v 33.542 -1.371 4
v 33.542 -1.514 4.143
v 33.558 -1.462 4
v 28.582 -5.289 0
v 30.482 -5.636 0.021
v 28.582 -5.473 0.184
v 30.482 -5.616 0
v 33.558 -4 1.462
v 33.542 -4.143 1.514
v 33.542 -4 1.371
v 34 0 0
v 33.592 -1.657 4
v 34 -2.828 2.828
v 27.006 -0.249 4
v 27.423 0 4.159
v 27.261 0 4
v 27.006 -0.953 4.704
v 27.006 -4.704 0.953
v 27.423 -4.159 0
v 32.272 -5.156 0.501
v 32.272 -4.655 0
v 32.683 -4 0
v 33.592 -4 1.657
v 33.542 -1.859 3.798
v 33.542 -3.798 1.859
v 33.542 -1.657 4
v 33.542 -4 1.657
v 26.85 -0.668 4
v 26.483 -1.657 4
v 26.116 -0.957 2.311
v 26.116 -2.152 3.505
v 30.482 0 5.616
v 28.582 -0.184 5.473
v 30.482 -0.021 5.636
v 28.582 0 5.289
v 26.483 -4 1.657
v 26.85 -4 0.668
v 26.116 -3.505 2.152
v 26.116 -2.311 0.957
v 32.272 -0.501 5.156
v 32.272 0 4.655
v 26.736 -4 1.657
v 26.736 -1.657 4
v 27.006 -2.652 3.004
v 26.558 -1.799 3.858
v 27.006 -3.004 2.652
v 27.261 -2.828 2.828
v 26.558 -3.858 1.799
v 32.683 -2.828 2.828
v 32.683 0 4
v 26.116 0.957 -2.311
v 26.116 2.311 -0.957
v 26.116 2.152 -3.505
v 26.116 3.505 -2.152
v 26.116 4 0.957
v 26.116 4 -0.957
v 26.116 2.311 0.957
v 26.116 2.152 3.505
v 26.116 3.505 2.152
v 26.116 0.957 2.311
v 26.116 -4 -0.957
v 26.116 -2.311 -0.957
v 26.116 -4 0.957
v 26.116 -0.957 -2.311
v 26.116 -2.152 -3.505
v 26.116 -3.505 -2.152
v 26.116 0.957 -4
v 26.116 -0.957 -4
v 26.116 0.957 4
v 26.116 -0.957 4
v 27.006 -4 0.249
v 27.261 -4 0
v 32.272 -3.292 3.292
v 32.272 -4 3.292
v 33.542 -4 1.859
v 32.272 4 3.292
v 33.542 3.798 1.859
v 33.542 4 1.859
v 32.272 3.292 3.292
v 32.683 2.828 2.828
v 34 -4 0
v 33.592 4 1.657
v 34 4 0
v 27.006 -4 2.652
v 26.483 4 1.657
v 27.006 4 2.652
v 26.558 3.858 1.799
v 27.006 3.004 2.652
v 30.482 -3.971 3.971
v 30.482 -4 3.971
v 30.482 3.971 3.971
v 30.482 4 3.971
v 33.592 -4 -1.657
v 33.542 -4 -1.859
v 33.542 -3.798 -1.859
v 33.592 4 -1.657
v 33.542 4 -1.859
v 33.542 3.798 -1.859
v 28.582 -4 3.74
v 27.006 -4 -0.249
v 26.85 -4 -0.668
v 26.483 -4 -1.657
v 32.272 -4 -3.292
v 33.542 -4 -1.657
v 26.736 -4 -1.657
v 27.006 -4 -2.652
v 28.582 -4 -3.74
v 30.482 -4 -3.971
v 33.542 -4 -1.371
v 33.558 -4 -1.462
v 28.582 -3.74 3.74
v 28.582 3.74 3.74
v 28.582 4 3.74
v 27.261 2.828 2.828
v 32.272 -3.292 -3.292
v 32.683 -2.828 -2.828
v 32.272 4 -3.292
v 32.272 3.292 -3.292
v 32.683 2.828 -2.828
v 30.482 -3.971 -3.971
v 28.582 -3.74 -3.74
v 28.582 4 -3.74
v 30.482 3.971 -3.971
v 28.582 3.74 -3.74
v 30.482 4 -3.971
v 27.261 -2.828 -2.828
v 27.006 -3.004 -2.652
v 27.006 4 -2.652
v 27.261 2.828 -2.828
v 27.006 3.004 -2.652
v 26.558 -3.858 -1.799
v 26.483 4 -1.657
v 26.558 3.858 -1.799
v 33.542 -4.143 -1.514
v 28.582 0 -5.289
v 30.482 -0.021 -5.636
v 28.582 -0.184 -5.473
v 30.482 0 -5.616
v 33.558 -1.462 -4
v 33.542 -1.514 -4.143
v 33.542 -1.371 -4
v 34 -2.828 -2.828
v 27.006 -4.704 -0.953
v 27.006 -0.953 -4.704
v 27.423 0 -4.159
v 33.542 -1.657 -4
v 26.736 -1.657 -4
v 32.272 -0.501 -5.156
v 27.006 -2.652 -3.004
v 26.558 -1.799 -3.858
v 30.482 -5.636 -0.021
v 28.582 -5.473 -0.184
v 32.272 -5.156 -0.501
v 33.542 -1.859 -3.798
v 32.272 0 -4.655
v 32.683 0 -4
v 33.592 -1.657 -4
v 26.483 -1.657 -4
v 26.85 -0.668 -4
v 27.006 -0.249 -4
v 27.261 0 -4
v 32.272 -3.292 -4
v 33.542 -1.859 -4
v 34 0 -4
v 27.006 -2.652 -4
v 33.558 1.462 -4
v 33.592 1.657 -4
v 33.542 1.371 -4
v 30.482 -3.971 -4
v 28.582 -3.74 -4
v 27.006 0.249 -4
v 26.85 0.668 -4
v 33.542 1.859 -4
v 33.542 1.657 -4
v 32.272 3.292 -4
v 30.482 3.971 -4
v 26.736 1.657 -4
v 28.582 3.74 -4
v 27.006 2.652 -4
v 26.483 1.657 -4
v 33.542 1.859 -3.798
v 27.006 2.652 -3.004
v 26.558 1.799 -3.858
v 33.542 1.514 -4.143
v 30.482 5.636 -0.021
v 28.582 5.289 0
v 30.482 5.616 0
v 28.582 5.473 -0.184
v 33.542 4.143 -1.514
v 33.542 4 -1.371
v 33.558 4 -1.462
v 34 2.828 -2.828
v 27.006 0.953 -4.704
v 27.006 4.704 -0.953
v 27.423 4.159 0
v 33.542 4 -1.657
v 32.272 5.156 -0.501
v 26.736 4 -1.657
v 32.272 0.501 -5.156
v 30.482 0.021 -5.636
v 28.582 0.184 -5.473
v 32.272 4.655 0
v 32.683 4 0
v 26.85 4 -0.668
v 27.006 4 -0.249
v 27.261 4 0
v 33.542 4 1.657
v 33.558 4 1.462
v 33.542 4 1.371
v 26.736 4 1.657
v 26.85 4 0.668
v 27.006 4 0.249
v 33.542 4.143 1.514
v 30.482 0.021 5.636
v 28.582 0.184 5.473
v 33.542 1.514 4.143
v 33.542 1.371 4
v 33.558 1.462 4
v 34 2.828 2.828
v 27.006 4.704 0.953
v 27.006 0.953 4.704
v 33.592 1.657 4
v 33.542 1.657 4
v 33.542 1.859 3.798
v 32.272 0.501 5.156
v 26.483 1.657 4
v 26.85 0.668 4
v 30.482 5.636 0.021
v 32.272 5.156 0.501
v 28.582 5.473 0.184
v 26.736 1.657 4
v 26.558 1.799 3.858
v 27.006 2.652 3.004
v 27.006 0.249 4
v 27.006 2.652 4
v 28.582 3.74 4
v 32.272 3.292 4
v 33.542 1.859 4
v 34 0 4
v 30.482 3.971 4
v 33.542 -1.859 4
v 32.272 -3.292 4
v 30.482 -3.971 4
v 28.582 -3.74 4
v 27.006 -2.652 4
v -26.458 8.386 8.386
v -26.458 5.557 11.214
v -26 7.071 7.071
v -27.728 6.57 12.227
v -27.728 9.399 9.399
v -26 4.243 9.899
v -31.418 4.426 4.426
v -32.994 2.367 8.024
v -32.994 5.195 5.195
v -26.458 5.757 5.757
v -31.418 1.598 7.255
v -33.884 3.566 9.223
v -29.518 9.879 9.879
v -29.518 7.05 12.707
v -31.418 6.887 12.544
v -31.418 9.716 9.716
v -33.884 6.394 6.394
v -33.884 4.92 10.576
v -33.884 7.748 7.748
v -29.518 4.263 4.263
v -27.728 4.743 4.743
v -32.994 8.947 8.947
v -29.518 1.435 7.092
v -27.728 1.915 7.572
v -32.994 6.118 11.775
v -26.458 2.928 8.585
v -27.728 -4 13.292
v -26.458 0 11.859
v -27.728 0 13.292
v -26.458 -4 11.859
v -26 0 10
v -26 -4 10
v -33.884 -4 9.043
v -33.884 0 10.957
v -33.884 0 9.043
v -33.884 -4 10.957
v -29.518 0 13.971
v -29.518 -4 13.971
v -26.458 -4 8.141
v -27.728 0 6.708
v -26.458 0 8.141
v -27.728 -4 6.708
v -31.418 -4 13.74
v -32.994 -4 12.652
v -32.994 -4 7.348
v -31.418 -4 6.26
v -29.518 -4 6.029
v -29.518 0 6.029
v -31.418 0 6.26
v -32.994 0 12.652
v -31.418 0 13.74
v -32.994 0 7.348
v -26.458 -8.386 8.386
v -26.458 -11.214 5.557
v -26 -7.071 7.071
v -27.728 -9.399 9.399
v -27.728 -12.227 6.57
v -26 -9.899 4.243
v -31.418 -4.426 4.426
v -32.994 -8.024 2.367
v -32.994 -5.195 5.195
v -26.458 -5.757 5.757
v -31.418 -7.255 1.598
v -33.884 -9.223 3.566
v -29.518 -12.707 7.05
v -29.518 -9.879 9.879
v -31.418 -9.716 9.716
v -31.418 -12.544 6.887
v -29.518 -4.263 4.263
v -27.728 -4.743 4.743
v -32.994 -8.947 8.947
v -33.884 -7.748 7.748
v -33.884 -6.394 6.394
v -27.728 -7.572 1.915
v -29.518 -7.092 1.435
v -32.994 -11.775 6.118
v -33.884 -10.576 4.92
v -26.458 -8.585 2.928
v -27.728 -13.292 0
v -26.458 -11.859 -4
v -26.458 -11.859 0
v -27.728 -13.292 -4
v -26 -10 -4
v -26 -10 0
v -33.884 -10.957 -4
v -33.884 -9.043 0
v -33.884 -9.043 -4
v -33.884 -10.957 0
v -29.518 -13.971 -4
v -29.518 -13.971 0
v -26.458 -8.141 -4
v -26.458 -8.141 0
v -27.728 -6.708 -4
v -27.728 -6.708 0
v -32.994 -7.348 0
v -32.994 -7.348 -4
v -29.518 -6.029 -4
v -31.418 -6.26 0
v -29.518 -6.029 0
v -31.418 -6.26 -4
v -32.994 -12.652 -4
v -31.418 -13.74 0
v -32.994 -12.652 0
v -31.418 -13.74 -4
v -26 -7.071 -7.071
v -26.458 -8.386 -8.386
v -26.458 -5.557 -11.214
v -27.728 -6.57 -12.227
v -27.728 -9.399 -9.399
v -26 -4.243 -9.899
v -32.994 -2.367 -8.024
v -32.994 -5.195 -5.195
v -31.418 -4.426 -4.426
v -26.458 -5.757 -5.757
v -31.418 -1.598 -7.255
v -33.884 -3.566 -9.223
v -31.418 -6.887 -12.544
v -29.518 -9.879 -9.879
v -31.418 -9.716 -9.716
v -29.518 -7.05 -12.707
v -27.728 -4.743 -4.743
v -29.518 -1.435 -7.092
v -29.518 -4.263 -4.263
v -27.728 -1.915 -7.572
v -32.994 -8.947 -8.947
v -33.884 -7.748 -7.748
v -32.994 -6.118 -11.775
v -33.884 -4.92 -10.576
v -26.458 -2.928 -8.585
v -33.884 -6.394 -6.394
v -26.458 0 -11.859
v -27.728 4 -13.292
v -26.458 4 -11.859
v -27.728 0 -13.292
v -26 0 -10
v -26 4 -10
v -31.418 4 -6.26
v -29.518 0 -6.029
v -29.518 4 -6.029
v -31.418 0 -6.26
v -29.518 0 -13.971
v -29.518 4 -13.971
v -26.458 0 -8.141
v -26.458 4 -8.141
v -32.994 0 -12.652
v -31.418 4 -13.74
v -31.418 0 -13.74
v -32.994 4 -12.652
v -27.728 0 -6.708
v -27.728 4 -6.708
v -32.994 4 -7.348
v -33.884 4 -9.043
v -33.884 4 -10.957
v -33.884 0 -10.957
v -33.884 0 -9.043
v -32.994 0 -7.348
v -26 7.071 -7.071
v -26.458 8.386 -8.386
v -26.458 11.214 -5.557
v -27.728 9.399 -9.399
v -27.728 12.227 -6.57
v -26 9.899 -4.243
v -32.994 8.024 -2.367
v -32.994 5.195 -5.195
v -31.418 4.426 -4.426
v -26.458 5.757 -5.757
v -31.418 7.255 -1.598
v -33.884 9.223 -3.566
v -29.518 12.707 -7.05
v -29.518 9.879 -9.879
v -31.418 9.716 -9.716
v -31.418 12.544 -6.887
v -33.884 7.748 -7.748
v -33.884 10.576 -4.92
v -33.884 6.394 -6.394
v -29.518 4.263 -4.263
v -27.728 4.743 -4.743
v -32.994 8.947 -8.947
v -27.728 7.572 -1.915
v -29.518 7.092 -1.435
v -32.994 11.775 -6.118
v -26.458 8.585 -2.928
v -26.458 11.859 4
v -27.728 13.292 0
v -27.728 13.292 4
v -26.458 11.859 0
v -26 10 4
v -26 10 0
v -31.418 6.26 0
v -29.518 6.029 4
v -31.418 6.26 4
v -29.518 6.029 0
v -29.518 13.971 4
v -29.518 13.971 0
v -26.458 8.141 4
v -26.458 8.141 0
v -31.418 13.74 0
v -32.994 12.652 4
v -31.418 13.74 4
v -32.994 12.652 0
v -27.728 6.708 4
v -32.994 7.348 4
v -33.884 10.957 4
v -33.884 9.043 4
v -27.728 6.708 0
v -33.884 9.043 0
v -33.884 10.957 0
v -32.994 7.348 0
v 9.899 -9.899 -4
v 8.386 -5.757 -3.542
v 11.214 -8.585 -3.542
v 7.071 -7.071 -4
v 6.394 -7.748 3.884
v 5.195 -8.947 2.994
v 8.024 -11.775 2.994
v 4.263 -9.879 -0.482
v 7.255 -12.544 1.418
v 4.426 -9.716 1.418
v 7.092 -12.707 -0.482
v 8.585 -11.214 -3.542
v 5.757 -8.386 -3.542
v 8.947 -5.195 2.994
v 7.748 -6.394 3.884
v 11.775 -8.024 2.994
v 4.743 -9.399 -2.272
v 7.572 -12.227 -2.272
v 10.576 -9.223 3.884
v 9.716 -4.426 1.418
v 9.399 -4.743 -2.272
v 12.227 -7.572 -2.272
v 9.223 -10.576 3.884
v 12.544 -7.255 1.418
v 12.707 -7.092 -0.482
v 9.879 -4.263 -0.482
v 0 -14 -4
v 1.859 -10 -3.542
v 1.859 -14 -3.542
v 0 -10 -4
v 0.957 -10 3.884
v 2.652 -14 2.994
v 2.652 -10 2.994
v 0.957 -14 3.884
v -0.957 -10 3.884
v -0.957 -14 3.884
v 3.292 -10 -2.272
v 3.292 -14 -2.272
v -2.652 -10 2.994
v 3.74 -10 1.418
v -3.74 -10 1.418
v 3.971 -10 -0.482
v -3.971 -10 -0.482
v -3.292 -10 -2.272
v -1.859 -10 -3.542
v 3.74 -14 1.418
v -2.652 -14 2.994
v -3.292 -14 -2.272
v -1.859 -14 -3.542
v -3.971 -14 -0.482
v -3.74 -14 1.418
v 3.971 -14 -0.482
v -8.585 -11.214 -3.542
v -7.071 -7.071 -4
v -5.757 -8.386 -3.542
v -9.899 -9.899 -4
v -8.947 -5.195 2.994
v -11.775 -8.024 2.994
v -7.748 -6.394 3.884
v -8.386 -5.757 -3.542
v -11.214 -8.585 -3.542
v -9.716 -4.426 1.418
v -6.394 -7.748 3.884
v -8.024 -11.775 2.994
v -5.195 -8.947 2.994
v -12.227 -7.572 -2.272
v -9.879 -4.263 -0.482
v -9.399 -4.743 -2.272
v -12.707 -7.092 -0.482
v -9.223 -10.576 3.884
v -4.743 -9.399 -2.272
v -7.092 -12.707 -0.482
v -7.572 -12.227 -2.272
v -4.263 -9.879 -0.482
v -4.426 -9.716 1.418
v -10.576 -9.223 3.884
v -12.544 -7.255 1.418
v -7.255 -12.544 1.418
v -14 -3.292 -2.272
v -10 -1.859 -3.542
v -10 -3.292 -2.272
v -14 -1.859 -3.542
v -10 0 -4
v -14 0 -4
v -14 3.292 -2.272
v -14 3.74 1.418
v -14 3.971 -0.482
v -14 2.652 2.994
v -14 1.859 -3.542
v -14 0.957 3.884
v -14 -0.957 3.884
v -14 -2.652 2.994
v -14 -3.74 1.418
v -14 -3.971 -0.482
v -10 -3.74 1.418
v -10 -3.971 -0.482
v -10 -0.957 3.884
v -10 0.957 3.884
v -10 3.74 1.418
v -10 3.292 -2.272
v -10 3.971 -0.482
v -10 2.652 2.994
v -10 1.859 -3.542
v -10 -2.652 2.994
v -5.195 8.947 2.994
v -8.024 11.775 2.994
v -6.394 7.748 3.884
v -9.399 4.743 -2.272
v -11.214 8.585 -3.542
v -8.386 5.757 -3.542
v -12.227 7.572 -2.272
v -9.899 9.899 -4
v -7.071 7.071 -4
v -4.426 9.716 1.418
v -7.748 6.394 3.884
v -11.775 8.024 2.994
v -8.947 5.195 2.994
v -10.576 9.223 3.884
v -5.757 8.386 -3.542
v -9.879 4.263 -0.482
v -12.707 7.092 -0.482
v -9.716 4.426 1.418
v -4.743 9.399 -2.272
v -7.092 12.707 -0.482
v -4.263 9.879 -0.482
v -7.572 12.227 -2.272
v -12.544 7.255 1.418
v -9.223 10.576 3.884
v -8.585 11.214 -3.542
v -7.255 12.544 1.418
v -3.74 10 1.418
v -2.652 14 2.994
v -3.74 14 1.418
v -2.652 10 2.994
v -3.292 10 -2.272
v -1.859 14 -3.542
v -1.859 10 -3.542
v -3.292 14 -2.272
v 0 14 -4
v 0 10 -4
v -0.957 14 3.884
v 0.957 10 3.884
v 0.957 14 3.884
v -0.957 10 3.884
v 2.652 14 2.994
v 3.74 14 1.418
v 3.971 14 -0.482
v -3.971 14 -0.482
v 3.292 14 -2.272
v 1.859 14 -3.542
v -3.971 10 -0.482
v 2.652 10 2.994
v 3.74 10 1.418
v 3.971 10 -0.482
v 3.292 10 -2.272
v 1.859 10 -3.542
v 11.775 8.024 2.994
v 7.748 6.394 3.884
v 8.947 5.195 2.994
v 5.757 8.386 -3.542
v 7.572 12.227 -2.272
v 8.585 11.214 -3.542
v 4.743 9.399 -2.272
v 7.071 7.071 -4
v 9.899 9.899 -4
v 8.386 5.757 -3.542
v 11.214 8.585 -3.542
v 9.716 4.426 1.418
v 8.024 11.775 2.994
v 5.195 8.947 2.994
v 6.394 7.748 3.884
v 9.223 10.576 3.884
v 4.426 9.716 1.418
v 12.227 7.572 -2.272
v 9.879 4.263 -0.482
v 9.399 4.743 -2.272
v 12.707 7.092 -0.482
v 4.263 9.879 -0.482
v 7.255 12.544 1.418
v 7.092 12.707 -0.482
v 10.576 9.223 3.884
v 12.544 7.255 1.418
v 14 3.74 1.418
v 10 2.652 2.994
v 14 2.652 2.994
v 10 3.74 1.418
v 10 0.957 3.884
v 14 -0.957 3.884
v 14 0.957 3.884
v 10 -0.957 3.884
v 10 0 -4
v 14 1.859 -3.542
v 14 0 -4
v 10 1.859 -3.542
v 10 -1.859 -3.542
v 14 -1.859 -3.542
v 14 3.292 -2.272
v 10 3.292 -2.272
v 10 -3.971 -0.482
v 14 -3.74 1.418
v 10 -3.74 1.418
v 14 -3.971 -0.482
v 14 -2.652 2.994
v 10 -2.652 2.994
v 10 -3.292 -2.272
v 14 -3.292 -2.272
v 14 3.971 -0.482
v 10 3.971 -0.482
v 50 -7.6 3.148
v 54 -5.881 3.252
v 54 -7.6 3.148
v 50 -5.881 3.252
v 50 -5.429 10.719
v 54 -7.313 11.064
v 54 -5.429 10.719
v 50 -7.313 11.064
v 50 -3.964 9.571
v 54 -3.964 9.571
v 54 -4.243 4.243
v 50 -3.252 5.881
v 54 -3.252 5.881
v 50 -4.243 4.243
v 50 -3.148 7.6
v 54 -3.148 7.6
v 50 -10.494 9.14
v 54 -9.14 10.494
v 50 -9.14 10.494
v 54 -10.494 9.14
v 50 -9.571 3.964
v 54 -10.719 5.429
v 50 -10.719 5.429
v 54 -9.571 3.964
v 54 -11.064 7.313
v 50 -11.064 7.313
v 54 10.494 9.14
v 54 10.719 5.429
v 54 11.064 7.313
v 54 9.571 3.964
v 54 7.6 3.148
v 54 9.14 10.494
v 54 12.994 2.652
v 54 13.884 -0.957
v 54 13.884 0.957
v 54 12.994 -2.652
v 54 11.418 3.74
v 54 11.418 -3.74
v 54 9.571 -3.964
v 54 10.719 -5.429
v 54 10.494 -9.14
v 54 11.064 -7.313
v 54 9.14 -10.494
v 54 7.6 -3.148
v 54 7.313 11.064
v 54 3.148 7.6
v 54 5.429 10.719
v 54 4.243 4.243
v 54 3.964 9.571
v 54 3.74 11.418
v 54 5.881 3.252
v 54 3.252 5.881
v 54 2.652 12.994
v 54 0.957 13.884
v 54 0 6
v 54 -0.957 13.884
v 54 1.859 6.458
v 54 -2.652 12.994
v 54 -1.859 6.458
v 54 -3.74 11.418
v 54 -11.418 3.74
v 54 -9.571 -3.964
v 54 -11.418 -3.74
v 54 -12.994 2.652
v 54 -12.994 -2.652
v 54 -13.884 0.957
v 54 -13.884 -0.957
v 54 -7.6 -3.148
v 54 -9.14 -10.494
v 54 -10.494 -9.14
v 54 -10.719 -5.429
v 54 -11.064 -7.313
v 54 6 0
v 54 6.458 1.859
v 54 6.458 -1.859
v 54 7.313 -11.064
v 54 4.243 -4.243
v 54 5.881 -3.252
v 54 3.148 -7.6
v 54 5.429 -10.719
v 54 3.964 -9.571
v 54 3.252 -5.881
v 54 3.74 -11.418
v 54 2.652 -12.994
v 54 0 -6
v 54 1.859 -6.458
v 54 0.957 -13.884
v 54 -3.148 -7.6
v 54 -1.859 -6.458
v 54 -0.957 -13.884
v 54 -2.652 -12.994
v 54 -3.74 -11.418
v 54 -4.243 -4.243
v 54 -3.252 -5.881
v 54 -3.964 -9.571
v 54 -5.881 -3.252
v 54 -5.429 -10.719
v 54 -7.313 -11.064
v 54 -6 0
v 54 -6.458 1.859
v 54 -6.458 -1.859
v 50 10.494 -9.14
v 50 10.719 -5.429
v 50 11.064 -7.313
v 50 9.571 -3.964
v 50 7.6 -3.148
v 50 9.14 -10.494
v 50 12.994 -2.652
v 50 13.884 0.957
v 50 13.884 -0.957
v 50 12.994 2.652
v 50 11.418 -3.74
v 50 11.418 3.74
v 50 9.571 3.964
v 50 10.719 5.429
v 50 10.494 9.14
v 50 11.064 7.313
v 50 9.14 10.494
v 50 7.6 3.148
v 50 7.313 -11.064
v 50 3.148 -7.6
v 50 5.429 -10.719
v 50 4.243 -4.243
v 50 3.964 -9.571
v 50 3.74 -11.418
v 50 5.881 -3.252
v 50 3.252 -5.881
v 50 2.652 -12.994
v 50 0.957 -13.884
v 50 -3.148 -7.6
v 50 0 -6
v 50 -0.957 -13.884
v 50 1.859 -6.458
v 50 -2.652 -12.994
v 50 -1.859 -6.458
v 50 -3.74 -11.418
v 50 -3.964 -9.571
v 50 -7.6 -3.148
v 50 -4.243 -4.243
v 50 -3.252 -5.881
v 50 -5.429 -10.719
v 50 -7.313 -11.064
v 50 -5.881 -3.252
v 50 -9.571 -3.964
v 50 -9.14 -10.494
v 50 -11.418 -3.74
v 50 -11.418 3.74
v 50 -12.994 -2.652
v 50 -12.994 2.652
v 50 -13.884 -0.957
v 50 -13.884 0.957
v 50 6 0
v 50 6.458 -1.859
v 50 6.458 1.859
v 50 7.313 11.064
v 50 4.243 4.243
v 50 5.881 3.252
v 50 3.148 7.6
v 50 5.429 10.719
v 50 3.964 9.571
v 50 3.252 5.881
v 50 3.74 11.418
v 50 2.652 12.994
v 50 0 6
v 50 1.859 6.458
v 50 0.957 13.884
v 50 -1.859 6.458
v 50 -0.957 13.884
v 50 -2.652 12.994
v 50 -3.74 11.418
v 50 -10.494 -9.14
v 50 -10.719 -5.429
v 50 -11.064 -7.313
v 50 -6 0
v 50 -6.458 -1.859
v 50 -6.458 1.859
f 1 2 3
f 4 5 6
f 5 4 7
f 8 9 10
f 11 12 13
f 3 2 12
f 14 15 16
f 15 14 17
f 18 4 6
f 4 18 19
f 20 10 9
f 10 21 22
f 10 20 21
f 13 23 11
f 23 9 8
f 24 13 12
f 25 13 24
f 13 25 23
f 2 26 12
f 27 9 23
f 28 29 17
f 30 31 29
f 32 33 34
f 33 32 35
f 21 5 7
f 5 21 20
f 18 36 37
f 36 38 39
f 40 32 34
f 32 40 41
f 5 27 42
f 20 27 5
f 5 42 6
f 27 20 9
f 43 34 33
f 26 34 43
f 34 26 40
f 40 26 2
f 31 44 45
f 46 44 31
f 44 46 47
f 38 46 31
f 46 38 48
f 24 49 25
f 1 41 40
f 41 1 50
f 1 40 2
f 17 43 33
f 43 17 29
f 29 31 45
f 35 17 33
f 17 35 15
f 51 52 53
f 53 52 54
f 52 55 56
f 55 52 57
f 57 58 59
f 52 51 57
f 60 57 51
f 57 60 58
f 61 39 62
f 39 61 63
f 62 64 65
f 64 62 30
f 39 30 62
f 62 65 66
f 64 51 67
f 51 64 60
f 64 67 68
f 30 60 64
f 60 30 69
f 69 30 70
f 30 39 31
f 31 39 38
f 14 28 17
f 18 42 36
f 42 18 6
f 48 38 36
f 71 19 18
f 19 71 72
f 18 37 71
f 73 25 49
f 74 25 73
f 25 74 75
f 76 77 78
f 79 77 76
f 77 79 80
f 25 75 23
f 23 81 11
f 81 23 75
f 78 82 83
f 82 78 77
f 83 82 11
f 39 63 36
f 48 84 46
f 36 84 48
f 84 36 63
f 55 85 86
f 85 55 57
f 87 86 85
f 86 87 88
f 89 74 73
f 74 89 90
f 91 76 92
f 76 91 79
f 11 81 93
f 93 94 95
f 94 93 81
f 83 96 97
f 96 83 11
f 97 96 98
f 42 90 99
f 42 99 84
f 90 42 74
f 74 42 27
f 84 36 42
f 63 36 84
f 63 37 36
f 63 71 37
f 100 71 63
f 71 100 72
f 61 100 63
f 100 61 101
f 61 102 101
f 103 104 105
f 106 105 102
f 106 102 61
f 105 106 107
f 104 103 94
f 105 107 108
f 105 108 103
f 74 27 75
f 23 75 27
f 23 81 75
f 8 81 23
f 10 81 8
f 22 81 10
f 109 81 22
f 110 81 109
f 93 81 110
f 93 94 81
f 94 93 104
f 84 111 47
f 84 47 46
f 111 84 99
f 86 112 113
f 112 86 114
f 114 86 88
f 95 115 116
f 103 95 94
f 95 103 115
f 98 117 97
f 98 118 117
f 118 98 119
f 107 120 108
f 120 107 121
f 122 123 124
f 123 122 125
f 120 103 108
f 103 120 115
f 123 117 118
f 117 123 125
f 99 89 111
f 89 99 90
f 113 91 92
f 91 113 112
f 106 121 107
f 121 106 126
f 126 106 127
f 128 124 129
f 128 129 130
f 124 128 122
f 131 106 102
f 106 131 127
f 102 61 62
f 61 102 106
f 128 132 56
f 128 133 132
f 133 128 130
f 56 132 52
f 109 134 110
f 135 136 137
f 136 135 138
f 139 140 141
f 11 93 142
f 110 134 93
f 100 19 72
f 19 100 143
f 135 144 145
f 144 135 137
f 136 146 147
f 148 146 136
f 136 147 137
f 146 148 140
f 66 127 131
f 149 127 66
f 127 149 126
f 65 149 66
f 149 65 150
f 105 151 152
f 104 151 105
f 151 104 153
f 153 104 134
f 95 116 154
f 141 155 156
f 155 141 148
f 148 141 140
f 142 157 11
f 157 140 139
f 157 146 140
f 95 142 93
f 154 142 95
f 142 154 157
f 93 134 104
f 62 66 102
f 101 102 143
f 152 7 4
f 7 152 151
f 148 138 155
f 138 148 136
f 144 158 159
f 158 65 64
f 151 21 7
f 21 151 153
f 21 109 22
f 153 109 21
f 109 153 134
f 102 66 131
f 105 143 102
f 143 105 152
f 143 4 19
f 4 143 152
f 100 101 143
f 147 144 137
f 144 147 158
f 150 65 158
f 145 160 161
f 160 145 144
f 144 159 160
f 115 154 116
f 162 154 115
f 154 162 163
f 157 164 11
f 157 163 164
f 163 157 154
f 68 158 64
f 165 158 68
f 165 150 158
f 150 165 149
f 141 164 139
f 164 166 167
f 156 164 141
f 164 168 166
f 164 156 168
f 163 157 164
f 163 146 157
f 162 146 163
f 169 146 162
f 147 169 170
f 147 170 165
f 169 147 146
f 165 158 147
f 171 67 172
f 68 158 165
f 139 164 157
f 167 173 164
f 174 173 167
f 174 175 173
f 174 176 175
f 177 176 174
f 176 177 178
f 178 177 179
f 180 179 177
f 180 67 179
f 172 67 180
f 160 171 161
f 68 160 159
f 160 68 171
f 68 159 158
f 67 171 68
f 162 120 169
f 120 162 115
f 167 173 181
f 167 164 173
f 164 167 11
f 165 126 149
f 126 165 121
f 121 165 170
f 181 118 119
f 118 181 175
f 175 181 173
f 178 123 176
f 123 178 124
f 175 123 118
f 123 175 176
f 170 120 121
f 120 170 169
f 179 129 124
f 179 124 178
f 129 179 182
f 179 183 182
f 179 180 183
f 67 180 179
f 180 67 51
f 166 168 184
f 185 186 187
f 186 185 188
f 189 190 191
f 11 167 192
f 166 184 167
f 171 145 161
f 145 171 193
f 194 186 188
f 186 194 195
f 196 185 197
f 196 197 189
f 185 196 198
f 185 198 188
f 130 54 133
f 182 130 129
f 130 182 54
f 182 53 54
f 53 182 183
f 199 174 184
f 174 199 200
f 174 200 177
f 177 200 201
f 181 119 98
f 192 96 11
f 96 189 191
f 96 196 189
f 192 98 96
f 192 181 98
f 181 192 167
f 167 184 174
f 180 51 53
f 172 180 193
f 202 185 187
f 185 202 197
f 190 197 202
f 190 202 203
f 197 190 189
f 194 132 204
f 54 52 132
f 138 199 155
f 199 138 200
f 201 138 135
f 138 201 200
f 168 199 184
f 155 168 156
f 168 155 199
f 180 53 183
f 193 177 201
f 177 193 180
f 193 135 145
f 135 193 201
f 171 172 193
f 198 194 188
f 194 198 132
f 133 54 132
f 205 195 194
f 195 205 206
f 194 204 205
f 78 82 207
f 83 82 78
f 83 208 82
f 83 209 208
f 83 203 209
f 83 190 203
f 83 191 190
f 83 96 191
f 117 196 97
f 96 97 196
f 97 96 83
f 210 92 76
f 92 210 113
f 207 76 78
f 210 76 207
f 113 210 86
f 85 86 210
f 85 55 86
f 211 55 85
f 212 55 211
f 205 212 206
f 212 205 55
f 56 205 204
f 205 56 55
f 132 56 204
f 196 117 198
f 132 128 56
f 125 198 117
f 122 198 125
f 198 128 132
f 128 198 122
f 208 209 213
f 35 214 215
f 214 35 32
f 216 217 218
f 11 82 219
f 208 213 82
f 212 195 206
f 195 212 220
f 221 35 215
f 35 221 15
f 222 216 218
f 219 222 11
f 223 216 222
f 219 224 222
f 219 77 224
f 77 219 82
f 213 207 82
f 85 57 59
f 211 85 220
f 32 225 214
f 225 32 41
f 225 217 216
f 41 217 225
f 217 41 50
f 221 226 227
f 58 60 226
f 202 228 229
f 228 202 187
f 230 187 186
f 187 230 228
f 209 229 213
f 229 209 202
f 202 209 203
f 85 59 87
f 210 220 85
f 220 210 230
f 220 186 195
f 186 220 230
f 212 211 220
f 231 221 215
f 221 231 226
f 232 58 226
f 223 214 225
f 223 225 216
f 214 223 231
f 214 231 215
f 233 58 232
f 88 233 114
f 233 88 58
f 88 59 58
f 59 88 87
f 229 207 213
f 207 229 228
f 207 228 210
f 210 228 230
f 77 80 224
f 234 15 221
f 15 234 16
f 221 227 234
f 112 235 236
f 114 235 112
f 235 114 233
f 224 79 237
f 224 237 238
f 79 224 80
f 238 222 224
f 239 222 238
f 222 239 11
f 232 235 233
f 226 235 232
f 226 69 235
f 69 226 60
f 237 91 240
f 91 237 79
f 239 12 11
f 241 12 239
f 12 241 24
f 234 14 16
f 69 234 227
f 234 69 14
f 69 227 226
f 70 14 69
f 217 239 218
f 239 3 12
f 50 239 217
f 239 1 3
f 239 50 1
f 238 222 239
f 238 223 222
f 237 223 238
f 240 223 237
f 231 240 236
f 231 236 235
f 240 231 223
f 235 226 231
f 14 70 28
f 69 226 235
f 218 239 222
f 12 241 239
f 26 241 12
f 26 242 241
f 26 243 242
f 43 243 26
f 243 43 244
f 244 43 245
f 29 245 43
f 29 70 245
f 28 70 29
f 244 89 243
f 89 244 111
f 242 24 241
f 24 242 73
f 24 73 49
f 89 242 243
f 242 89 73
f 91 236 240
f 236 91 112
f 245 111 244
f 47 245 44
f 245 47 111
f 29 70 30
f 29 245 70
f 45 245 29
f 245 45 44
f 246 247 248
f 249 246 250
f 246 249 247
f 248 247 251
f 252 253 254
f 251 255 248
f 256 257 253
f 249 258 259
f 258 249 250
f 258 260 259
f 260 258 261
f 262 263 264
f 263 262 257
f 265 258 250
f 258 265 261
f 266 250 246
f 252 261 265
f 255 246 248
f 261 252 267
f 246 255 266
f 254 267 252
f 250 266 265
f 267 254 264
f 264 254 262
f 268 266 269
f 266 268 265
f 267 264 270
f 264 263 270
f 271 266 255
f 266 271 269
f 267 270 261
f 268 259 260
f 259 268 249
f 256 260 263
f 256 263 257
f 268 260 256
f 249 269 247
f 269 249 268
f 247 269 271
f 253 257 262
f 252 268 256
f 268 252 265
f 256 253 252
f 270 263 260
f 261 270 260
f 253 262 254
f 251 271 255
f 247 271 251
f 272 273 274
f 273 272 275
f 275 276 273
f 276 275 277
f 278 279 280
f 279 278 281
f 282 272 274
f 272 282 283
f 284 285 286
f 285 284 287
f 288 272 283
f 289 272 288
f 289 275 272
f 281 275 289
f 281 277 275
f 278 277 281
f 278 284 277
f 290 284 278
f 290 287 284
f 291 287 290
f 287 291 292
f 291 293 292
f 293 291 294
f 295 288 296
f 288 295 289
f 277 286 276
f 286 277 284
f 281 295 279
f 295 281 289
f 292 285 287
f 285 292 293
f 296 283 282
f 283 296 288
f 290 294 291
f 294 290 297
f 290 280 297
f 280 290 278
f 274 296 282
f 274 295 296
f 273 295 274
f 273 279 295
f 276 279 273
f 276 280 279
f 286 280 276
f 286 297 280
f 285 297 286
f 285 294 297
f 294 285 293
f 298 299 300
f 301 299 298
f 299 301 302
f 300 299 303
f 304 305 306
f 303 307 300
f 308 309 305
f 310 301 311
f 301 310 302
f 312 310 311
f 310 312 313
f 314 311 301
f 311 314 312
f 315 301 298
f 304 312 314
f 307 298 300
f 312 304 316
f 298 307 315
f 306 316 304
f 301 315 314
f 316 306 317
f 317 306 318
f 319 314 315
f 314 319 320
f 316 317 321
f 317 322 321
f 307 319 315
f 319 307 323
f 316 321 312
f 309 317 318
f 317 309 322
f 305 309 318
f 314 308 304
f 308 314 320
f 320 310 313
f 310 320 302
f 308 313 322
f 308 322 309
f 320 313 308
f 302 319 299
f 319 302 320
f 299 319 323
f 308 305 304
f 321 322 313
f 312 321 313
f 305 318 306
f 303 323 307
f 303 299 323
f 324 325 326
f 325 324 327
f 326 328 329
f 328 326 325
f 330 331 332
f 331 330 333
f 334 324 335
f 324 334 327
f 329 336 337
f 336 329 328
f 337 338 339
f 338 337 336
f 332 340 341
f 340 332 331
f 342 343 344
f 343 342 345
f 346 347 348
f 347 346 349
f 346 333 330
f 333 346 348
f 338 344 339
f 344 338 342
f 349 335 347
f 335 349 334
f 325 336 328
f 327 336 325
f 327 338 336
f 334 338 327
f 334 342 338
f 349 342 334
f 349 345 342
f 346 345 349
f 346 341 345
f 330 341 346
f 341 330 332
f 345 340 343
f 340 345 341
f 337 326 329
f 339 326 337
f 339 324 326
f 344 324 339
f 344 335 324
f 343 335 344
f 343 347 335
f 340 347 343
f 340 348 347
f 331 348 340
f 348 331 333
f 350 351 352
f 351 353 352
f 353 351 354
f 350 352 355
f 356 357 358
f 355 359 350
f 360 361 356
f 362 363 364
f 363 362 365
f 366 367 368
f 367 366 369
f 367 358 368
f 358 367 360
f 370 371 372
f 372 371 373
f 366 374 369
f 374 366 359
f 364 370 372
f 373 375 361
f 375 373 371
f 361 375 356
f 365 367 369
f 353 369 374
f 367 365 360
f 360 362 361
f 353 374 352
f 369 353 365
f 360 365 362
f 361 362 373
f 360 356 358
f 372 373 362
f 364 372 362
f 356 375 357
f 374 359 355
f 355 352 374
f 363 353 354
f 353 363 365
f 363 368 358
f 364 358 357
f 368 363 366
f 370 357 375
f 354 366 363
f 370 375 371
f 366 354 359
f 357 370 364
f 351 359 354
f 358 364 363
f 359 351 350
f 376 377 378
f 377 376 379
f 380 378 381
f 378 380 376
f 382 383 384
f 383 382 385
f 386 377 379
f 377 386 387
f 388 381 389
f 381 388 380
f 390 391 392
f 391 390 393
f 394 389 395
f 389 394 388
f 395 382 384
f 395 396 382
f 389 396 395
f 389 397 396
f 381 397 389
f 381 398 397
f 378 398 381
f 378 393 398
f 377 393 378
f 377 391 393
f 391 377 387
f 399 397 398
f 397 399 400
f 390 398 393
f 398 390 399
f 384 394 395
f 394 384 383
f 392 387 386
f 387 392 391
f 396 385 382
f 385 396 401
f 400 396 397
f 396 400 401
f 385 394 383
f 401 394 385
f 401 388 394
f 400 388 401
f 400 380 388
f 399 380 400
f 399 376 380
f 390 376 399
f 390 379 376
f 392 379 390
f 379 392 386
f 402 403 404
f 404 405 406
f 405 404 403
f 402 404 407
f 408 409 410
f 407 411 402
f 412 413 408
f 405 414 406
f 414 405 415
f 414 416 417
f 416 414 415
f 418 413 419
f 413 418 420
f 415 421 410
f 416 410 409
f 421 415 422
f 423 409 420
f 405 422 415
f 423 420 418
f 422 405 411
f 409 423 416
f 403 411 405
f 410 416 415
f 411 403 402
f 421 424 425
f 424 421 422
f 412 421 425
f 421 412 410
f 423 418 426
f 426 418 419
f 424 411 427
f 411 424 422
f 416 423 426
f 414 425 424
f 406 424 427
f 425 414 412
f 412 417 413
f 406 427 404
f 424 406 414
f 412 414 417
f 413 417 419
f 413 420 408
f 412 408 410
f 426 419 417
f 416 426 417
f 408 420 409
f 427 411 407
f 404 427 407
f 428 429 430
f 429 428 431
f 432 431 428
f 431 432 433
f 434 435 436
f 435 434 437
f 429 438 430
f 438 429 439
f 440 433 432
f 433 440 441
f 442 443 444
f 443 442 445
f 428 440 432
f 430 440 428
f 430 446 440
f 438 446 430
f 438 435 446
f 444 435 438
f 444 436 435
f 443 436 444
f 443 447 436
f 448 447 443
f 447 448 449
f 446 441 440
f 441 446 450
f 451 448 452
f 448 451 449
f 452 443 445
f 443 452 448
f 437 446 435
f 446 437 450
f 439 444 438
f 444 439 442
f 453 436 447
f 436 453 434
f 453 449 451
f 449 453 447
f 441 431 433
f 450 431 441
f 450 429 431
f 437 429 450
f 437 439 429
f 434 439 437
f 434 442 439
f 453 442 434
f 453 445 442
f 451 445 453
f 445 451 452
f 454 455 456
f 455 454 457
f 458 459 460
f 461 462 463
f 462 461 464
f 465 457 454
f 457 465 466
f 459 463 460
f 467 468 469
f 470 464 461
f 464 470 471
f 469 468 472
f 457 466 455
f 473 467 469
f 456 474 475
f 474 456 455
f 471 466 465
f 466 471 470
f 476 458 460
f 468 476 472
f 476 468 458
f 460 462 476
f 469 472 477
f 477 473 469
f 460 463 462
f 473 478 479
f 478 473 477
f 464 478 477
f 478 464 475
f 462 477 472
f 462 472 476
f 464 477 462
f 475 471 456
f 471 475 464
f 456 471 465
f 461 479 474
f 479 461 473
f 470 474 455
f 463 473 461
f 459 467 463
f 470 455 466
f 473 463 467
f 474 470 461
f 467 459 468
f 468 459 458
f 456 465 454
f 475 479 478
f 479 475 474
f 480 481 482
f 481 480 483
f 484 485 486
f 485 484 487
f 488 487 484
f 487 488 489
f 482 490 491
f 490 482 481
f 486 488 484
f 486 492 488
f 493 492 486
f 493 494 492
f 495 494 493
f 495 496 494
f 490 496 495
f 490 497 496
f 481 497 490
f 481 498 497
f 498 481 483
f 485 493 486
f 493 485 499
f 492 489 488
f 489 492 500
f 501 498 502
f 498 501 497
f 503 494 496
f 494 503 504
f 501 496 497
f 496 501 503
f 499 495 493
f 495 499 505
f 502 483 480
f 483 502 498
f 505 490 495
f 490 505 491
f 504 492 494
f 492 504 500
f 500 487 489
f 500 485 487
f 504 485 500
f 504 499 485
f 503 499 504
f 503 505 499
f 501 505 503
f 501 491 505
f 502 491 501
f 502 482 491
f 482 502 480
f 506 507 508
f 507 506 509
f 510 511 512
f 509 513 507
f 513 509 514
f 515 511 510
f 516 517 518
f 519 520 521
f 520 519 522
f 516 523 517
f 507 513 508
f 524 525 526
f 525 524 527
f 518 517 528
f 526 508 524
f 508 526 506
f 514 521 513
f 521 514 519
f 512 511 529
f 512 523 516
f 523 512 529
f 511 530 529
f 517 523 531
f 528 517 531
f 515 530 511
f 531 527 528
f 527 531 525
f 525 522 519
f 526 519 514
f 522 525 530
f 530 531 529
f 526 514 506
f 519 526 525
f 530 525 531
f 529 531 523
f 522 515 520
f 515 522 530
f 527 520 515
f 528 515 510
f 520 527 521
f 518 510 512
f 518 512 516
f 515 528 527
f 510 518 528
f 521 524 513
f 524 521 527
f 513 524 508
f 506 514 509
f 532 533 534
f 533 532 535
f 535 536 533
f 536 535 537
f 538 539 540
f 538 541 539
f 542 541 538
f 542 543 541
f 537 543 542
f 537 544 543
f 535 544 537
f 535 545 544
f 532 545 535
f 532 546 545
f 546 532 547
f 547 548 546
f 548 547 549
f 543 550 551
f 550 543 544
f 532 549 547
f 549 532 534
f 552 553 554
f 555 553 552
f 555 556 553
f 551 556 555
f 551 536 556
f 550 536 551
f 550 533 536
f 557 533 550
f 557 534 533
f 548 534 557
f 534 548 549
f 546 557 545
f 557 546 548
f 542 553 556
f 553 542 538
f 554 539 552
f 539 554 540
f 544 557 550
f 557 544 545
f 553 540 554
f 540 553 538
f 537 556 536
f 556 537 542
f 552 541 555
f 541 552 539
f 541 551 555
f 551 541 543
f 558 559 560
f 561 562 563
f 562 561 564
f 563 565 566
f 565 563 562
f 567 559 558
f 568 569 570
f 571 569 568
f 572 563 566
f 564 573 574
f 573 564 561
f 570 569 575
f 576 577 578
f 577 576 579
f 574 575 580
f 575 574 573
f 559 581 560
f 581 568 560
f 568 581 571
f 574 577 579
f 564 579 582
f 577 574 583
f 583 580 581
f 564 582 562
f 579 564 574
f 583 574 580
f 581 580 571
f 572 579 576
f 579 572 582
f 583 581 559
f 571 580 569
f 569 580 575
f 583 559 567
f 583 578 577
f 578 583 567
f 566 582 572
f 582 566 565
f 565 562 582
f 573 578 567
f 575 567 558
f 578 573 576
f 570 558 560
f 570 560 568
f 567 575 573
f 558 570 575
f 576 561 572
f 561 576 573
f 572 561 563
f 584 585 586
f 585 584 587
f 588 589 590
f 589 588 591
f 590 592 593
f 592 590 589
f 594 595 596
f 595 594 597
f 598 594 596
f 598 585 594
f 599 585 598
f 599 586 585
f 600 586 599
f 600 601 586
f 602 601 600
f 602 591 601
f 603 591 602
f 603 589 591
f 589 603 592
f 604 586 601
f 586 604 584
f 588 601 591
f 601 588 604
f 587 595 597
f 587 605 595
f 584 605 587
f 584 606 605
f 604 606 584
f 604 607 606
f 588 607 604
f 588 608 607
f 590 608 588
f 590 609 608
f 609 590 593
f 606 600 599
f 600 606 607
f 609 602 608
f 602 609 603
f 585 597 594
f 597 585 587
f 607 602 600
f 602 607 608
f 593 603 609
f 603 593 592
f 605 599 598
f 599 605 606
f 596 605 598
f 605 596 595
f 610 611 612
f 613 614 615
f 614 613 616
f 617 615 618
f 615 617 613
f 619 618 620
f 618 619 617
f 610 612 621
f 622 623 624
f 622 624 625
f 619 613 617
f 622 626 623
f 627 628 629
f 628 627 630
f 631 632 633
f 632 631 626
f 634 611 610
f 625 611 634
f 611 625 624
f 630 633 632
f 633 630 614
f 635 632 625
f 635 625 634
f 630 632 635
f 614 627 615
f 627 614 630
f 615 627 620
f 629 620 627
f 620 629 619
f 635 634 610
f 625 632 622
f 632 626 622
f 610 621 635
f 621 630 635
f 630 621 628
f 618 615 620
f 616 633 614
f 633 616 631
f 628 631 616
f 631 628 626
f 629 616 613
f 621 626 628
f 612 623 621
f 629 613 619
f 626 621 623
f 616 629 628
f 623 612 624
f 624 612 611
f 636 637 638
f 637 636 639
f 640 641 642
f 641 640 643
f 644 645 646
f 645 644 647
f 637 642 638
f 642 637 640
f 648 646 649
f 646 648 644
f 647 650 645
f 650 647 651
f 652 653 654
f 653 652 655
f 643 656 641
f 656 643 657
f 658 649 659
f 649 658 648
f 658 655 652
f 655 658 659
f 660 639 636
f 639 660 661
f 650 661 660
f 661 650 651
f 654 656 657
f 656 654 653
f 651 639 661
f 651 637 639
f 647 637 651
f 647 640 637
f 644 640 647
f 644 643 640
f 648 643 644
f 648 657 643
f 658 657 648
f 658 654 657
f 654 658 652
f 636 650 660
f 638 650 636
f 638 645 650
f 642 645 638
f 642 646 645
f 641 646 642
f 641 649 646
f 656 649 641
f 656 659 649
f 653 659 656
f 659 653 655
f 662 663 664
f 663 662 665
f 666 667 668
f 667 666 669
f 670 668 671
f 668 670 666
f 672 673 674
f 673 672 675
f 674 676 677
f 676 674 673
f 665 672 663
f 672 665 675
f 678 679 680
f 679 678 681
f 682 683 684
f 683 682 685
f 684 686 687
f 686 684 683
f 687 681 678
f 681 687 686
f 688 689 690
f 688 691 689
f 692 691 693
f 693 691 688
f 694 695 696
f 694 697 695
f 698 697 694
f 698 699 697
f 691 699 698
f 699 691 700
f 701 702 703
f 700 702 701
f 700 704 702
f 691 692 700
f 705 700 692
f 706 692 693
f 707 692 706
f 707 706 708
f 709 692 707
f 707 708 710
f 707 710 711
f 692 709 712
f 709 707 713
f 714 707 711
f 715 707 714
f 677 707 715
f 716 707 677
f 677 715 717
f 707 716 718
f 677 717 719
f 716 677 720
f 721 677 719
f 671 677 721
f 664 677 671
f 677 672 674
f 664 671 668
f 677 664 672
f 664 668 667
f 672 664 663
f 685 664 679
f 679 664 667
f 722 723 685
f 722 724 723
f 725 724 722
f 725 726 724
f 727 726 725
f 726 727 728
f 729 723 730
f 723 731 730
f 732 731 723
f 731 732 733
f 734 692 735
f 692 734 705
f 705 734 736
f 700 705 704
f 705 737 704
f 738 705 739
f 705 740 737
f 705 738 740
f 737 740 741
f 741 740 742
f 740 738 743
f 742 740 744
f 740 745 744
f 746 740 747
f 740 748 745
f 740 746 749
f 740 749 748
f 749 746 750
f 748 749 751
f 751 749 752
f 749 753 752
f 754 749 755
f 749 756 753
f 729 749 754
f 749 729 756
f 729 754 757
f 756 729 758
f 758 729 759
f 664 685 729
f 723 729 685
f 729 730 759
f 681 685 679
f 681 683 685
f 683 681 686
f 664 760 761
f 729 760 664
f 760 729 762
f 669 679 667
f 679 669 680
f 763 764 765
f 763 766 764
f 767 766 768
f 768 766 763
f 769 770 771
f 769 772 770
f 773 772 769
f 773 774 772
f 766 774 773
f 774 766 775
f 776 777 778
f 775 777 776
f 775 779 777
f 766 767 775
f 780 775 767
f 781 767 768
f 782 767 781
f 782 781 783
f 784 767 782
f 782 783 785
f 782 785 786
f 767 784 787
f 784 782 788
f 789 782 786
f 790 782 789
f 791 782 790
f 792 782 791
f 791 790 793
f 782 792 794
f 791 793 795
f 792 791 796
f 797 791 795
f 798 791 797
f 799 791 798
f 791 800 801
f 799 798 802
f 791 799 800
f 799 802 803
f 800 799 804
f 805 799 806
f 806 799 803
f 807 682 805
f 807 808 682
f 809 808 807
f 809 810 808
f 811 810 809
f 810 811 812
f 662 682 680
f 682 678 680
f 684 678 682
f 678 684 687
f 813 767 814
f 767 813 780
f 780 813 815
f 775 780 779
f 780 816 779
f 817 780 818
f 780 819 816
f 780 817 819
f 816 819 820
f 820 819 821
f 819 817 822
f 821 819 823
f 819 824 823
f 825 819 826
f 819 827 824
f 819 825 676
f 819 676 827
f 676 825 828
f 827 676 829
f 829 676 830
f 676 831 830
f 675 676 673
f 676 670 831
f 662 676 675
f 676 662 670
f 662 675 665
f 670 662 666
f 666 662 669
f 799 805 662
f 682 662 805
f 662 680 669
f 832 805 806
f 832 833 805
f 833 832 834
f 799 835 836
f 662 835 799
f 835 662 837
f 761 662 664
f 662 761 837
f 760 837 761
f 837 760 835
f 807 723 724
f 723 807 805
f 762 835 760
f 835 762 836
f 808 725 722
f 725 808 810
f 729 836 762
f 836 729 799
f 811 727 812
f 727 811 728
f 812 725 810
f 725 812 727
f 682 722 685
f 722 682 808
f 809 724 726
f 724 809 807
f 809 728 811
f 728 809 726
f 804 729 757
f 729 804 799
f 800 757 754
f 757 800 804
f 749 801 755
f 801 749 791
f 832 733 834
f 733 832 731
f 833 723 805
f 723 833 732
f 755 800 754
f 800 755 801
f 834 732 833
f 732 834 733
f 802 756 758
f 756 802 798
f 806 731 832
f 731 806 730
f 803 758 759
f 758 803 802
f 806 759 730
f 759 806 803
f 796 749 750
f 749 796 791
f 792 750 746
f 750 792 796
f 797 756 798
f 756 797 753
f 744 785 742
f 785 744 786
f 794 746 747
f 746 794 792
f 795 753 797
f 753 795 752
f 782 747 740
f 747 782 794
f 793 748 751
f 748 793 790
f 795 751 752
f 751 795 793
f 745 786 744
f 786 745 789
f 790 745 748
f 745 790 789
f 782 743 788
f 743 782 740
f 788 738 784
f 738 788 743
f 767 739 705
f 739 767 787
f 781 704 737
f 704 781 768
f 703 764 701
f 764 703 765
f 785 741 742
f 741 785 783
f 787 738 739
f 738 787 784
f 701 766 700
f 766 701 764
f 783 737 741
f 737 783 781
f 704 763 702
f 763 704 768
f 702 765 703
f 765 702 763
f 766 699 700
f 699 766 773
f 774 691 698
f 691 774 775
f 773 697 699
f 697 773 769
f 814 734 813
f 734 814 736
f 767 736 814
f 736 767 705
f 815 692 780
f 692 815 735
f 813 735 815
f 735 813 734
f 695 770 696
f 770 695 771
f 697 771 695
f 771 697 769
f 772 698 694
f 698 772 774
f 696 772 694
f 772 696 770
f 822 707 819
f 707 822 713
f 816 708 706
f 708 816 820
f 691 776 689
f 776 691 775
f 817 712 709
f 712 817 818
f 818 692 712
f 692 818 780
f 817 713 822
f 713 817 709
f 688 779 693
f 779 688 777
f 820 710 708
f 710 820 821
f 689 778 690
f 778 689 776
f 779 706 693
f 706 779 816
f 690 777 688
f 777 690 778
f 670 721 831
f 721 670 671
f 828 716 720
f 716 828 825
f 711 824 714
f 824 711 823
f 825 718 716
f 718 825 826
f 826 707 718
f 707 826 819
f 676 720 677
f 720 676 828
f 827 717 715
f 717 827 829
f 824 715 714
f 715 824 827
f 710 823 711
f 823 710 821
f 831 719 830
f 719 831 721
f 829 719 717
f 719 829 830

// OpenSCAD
for (s=[45:45:360]) {
  rotate([s, 0, 0]) {
    translate([30, 0, 0]) {
      cylinder(r=4, h=4);
    }
  }  
}

for (s=[45:45:360]) {
  rotate([s, 0, 0]) {
    translate([-30, 10, 0]) {
      cylinder(r=4, h=4);
    }
  }  
}

for (s=[45:45:360]) {
  rotate([s, 90, 0]) {
    translate([0, 0, 10]) {
      cylinder(r=4, h=4);
    }
  }  
}

for (s=[45:45:360]) {
  rotate([s, 0, 0]) {
    translate([50, 0, 10]) {
      rotate([0, 90, 0]) {
        cylinder(r=4, h=4);
      }
      
    }
  }  
}
